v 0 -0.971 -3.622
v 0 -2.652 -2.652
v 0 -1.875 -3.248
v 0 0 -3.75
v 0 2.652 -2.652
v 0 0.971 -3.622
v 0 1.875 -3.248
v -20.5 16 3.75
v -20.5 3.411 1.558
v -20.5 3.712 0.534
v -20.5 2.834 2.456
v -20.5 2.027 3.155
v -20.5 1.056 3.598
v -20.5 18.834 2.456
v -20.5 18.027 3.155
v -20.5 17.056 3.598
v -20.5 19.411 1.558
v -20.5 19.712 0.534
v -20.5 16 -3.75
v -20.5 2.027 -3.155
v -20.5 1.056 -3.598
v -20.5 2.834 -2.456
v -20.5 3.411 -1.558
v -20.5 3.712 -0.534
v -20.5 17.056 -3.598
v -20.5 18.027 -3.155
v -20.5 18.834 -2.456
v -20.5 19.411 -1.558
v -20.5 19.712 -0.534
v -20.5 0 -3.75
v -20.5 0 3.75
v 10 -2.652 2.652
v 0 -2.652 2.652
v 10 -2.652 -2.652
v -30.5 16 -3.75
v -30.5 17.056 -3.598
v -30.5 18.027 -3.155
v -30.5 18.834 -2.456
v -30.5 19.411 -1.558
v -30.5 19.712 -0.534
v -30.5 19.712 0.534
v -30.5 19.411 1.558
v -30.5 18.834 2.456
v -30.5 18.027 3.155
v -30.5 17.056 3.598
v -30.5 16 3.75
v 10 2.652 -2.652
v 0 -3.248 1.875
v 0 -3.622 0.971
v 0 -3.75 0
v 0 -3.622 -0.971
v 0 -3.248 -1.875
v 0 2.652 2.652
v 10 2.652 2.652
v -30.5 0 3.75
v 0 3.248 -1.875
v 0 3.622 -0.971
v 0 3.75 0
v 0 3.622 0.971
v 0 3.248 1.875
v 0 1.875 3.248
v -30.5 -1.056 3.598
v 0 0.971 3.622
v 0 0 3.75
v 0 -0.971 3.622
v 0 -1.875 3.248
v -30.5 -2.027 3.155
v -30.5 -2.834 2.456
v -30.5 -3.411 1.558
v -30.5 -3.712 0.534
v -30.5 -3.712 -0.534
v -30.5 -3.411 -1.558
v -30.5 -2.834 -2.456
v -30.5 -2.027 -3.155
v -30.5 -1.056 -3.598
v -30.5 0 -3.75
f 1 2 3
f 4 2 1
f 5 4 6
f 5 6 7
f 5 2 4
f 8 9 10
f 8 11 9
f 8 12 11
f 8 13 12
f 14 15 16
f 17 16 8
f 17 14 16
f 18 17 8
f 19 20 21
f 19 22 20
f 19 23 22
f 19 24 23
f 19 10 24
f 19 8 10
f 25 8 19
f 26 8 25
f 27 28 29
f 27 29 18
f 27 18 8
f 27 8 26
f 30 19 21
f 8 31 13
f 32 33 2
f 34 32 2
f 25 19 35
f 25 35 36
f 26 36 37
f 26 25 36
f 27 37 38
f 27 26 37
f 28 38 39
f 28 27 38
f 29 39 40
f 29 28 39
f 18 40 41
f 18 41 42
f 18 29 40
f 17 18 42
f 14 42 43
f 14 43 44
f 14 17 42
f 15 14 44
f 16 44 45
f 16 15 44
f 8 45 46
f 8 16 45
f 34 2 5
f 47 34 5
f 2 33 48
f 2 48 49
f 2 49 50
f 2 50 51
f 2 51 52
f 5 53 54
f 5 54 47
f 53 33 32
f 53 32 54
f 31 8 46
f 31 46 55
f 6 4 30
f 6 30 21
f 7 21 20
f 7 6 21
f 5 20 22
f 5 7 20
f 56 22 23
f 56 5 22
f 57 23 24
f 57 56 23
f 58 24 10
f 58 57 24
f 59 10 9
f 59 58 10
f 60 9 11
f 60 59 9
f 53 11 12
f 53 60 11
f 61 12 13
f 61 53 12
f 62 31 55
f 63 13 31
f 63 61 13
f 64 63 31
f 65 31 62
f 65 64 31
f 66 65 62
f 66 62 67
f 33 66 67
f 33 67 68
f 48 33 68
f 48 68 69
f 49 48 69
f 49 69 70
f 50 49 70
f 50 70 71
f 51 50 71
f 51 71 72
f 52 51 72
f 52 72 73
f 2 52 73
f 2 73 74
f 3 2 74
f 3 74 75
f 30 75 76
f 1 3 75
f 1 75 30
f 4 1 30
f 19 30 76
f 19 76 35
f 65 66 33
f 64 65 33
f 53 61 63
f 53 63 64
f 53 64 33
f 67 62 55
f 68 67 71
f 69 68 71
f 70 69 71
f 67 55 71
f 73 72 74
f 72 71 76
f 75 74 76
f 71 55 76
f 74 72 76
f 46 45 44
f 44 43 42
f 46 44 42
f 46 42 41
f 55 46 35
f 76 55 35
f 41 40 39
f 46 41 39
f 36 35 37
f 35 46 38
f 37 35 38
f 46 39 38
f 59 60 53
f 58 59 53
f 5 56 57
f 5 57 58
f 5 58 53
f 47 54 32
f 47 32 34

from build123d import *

# Parameters (mm, degrees)
SKETCH1_R           = 3.75
BOSS_EXTRUDE1_DEPTH = 30.5
SKETCH2_W           = 5.303300858
SKETCH2_H           = 5.303300858
BOSS_EXTRUDE2_DEPTH = 10
BOSS_EXTRUDE3_START = -10
BOSS_EXTRUDE3_DEPTH = 10


with BuildPart() as part:
    # Sketch1 → Boss-Extrude1 (new body)
    with BuildSketch(Plane(origin=(0, 0, 0), x_dir=(0, 0, -1), z_dir=(1, 0, 0))):
        Circle(SKETCH1_R)
    extrude(amount=-BOSS_EXTRUDE1_DEPTH)

    # Sketch2 → Boss-Extrude2 (add)
    with BuildSketch(Plane(origin=(0, 0, 0), x_dir=(0, 0, -1), z_dir=(1, 0, 0))):
        Rectangle(SKETCH2_W, SKETCH2_H)
    extrude(amount=BOSS_EXTRUDE2_DEPTH)

    # Sketch3 → Boss-Extrude3 (add)
    with BuildSketch(Plane.ZY.offset(30.5).offset(BOSS_EXTRUDE3_START)):
        with BuildLine():
            Line((-3.75, 0), (-3.75, 16))
            ThreePointArc((-3.75, 16), (0, 19.75), (3.75, 16))
            Line((3.75, 16), (3.75, 0))
            ThreePointArc((3.75, 0), (0, -3.75), (-3.75, 0))
        make_face()
    extrude(amount=BOSS_EXTRUDE3_DEPTH)


solid = part.part
